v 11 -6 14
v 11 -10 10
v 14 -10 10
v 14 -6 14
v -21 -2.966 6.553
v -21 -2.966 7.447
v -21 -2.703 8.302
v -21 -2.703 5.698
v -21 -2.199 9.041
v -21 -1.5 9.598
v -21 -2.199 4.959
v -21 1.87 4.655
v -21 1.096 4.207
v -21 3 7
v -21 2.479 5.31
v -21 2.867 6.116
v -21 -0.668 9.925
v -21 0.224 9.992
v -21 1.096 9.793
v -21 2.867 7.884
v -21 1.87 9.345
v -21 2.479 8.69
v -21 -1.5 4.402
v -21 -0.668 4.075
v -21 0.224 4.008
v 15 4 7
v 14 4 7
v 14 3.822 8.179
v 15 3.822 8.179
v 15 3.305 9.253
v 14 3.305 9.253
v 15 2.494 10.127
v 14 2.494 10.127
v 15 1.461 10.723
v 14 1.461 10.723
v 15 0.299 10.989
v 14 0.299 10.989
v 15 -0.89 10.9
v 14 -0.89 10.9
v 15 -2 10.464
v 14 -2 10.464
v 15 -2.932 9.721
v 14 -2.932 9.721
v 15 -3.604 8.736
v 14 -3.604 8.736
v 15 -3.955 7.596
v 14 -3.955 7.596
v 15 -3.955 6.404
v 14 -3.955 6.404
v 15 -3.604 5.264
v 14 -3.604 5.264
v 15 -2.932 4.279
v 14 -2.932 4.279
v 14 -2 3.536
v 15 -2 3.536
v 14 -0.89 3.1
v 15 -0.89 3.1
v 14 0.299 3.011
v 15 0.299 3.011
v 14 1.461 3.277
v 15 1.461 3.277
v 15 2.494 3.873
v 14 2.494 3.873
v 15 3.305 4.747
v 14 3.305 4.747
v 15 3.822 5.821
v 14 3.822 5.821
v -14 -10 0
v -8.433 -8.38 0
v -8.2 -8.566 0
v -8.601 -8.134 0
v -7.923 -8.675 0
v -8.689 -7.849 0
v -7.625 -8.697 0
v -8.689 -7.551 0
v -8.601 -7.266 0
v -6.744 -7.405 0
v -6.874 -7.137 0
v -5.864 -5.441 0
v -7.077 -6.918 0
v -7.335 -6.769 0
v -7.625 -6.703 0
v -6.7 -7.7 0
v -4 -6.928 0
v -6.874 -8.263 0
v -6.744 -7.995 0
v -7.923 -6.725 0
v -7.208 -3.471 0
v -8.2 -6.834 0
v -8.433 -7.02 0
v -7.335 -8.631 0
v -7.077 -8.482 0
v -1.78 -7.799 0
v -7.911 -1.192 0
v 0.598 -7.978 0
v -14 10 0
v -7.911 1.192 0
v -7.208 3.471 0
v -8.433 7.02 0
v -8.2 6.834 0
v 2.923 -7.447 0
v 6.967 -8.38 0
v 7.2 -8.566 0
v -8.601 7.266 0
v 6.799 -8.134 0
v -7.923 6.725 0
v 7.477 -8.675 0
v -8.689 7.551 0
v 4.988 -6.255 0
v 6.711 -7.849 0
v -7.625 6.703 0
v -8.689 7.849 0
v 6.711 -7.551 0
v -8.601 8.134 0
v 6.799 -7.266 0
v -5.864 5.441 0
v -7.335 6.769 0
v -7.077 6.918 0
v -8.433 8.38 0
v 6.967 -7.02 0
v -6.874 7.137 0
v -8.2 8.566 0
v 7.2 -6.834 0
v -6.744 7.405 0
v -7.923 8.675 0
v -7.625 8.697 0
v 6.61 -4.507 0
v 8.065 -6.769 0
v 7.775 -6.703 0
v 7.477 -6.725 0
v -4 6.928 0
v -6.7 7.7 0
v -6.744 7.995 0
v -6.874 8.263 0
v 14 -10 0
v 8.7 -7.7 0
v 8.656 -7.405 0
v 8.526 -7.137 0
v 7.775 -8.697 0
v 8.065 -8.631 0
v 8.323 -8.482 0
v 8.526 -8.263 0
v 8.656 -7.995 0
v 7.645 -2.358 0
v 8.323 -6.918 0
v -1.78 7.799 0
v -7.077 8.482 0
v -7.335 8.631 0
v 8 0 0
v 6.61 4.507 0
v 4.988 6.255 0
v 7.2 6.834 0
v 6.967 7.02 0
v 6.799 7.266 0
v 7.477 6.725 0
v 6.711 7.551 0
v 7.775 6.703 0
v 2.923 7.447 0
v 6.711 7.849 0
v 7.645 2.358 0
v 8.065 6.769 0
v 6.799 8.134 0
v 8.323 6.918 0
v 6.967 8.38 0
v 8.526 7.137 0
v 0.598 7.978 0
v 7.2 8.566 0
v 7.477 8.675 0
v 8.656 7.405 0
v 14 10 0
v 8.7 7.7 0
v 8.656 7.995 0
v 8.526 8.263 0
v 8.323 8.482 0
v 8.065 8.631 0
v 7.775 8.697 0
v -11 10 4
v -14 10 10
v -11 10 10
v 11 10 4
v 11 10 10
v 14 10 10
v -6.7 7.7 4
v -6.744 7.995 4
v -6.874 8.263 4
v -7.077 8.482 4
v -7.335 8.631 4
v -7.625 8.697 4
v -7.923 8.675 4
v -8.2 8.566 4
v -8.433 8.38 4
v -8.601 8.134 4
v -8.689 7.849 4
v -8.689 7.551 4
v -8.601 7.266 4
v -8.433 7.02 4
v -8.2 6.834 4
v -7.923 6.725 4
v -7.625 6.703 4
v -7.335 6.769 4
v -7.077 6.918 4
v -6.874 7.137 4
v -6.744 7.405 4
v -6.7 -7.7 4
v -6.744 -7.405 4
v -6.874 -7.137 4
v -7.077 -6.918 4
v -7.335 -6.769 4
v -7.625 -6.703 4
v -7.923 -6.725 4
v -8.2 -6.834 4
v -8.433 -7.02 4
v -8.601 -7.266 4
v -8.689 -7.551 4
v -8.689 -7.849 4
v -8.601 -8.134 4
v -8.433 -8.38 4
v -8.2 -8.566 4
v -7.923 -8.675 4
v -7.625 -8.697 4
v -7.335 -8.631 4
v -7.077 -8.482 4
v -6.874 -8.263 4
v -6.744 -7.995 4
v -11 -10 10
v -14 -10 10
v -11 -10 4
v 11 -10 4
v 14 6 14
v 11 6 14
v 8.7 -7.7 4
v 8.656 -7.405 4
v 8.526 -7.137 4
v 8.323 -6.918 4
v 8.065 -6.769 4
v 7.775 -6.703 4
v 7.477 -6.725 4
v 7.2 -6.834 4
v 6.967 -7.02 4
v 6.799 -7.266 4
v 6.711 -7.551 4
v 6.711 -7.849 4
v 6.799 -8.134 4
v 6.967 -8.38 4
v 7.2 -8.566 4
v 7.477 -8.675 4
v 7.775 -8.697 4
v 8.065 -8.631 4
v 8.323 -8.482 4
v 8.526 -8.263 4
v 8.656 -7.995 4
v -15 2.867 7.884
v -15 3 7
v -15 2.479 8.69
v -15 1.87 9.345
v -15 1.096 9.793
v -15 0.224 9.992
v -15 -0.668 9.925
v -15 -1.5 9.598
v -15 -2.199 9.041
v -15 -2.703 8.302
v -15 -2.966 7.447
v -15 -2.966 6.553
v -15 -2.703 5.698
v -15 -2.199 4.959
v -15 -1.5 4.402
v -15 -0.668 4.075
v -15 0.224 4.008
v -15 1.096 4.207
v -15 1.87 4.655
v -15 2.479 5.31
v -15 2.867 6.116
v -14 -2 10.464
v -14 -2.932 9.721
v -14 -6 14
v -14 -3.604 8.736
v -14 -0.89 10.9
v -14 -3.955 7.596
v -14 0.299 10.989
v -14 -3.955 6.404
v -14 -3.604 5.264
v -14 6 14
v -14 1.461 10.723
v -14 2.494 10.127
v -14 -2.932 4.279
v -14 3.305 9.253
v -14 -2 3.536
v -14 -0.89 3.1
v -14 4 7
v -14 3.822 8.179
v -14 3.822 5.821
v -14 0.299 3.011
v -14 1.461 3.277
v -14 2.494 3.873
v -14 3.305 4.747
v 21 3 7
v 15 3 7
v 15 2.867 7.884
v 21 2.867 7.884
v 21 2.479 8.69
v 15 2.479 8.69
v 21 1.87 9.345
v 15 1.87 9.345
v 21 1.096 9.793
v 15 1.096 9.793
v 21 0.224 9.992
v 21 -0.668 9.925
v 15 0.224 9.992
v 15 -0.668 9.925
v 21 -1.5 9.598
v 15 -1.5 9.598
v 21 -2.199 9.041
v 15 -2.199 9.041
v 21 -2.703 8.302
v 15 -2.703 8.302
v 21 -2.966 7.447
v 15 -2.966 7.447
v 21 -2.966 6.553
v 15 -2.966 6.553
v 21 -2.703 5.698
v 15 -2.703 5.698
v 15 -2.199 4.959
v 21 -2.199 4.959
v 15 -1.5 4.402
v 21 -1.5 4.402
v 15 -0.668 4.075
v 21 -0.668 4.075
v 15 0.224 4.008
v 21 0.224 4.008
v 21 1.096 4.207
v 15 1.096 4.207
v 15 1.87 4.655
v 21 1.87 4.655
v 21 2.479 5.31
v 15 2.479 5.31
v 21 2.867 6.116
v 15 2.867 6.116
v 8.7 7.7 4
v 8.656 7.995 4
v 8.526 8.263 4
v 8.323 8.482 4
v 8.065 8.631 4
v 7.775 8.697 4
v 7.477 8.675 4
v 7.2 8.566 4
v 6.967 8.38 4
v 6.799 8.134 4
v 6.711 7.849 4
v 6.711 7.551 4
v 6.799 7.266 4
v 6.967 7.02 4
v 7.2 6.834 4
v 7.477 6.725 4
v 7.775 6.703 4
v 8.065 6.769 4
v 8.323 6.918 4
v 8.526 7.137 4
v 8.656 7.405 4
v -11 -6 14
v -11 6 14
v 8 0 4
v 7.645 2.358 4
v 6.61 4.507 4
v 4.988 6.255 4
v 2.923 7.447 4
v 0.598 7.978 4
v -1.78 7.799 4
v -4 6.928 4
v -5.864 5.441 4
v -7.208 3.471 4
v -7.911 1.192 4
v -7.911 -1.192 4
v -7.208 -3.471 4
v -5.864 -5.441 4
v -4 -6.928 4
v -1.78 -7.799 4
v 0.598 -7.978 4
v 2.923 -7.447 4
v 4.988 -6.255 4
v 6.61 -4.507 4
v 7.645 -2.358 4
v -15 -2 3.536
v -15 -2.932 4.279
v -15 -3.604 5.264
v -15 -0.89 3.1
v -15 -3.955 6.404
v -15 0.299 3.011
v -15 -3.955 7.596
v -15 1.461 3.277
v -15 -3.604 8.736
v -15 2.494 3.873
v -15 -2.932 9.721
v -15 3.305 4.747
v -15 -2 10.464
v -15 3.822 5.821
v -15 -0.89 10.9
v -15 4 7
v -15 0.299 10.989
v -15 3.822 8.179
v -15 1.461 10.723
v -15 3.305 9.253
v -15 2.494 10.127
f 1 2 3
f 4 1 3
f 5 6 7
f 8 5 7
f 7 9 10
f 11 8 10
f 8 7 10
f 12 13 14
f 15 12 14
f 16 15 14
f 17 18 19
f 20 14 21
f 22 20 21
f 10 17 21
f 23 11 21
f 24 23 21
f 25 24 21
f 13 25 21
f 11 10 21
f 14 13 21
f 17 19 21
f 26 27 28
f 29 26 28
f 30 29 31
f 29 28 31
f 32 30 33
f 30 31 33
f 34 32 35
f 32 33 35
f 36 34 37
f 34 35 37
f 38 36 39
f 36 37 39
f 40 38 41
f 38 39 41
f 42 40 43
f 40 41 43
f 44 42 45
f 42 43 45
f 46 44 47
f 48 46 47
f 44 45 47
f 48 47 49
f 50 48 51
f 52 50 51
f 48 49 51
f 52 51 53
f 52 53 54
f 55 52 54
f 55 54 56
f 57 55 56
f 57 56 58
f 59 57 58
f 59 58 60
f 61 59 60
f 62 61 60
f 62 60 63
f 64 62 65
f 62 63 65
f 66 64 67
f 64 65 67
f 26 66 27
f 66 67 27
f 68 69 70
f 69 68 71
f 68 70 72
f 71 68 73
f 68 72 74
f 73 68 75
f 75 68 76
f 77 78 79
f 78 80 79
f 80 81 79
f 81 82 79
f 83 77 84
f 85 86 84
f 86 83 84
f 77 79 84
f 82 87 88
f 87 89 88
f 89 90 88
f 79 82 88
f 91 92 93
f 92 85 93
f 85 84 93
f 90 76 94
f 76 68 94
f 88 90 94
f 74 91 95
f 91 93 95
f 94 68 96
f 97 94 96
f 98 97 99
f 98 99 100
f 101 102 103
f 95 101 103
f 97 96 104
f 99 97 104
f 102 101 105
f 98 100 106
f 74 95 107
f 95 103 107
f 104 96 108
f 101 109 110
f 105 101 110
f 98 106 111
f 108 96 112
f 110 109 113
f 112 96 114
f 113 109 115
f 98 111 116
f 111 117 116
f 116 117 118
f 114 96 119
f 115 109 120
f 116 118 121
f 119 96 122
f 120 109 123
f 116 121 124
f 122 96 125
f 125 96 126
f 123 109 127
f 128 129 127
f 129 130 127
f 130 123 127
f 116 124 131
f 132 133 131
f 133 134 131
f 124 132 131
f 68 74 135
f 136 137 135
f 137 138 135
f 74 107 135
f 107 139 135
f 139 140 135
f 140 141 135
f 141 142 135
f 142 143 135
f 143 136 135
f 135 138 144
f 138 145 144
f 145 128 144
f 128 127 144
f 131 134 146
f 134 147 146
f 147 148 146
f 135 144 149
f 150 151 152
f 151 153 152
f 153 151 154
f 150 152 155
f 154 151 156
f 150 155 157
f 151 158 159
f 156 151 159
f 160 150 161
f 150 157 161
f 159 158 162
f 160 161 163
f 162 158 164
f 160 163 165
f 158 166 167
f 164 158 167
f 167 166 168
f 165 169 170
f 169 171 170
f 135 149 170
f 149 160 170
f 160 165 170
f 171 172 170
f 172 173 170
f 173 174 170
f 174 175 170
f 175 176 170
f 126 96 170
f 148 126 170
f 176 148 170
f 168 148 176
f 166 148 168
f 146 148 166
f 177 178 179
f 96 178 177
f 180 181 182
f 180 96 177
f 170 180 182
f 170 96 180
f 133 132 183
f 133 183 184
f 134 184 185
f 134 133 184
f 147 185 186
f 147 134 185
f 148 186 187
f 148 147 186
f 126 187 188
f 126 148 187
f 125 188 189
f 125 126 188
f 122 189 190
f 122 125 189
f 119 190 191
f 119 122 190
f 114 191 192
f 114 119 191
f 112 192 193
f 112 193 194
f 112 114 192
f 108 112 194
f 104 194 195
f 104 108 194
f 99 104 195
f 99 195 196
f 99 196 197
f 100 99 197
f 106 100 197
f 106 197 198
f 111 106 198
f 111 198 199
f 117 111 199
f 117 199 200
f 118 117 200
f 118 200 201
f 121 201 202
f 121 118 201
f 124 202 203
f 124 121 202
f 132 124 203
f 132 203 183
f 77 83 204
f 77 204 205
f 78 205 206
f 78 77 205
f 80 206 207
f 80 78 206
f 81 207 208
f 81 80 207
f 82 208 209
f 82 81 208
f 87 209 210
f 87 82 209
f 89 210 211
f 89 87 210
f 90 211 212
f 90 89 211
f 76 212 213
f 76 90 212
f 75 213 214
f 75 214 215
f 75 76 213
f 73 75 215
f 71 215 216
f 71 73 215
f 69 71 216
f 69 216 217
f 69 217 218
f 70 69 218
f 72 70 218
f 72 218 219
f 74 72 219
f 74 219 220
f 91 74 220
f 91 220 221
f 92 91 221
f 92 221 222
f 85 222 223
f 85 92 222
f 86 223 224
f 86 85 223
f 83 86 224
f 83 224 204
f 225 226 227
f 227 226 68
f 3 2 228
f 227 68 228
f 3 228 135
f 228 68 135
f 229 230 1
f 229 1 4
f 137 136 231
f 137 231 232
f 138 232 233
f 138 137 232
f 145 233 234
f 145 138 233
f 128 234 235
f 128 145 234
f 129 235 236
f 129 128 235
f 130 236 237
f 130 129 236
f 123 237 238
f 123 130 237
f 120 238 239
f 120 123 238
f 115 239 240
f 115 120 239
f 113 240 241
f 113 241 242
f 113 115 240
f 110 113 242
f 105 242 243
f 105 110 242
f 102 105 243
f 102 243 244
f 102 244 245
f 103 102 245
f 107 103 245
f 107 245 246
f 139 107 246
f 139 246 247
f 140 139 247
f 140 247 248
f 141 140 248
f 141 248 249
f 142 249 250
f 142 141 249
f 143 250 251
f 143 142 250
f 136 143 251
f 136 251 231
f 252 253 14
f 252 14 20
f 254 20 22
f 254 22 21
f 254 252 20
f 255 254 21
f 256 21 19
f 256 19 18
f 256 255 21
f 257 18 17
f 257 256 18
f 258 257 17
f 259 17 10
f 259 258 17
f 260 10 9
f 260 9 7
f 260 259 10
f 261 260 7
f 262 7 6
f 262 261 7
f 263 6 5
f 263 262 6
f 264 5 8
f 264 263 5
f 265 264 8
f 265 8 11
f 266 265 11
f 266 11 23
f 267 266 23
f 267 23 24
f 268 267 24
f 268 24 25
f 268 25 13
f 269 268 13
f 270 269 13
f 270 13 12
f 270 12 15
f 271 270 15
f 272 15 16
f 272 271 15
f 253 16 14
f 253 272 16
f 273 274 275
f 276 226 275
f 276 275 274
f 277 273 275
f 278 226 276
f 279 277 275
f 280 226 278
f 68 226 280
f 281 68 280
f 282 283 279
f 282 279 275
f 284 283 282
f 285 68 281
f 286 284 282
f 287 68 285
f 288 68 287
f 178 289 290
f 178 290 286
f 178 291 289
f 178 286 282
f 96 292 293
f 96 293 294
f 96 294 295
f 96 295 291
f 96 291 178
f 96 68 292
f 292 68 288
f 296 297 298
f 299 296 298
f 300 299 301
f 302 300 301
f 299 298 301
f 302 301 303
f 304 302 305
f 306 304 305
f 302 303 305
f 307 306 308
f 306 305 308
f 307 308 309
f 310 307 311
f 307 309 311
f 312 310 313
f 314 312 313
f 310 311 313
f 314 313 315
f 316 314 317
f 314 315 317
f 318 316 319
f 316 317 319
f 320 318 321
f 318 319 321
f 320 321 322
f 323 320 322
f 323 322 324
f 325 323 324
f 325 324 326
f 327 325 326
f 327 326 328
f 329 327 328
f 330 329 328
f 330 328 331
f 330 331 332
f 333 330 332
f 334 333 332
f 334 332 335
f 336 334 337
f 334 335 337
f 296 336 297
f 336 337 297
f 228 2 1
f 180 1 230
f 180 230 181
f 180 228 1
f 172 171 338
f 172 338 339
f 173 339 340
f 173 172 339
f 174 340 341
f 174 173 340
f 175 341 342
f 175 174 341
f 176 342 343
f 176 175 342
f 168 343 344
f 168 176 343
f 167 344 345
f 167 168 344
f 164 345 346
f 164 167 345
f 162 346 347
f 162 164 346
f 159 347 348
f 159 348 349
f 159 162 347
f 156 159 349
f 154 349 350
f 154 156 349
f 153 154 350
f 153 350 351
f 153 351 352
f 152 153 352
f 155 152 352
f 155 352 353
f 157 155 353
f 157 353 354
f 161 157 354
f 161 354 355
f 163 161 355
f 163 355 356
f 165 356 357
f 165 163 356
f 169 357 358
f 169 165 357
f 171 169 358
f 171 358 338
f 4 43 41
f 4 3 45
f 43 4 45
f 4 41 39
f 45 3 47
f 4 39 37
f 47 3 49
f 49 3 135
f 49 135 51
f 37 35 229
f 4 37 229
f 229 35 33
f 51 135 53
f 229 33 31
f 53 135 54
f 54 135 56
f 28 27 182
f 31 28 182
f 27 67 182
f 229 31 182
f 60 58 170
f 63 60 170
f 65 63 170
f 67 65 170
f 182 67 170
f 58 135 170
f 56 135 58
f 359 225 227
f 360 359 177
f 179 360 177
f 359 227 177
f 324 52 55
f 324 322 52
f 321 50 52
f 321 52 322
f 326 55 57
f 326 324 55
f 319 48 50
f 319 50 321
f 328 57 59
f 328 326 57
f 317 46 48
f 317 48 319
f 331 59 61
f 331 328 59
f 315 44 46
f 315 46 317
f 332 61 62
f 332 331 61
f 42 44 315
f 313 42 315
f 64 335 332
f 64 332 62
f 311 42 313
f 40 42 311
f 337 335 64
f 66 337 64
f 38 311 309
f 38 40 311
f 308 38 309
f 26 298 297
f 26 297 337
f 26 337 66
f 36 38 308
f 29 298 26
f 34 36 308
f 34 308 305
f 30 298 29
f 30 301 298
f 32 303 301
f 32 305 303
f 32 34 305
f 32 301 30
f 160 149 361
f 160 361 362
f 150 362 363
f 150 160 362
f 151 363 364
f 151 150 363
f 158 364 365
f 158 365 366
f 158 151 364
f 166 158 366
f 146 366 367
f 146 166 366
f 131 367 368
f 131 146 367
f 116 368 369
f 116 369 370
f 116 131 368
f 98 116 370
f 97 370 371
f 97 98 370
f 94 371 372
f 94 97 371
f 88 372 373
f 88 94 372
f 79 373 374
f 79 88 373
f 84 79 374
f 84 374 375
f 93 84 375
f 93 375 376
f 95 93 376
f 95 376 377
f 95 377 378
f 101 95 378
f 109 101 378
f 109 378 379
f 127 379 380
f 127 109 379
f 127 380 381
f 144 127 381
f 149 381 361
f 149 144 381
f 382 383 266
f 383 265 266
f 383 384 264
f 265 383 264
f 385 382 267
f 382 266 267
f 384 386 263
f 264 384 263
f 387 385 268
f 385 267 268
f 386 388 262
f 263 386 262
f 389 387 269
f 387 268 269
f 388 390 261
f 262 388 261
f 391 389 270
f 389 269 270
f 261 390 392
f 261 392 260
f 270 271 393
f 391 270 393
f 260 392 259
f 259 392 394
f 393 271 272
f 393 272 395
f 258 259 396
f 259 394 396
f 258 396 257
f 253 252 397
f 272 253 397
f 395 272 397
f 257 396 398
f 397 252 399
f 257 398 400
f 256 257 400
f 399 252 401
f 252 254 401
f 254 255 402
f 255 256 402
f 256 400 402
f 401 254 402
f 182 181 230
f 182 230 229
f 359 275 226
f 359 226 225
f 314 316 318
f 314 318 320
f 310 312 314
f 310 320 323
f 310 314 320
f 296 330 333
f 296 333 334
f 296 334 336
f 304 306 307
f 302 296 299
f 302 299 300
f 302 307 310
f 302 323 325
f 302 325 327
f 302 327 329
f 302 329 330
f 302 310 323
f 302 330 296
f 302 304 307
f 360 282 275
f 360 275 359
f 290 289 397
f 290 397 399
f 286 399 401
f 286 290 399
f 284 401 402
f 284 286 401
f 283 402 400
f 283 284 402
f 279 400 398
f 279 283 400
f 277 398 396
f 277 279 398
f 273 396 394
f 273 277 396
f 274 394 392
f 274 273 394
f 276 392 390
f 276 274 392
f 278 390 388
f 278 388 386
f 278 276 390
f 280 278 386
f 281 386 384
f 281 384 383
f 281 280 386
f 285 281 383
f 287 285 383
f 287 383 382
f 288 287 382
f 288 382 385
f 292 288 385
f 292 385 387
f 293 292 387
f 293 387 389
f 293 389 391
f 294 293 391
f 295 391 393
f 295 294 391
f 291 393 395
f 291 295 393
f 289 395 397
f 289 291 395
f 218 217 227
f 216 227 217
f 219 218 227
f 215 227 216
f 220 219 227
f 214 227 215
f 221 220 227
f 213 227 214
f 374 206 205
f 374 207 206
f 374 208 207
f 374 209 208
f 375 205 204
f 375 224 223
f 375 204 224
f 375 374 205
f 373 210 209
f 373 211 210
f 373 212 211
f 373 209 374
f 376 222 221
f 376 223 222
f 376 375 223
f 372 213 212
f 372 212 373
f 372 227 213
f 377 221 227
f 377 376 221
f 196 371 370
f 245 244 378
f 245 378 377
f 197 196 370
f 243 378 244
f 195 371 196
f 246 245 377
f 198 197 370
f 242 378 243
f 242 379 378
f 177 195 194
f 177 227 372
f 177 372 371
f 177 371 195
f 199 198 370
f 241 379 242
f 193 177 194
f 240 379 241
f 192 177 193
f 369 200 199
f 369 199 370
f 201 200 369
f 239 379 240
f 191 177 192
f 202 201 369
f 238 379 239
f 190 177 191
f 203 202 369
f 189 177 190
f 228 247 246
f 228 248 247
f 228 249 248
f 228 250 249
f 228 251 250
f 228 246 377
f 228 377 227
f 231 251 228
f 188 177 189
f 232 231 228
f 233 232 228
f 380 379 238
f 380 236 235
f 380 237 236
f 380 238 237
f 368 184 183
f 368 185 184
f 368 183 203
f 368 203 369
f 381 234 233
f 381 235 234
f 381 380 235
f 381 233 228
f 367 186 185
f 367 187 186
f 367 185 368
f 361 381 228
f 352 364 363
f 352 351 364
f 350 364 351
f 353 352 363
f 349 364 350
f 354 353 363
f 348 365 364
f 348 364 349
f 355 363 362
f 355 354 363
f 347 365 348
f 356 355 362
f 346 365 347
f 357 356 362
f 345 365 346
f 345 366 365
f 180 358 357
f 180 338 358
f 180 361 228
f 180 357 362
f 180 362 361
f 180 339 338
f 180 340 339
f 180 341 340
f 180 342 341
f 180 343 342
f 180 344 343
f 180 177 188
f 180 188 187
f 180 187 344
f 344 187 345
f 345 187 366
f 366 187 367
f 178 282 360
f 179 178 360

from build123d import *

# Parameters (mm, degrees)
SKETCH_1_W      = 28
SKETCH_1_H      = 20
SKETCH_1_R      = 1
SKETCH_1_R_2    = 8
EXTRUDE_1_DEPTH = 4
SKETCH_2_W      = 3
SKETCH_2_H      = 20
EXTRUDE_2_DEPTH = 10
SKETCH_3_R      = 4
SKETCH_3_R_2    = 3
EXTRUDE_3_DEPTH = 1
SKETCH_4_R      = 3
EXTRUDE_4_DEPTH = 6
CHAMFER_1_SIZE  = 4


with BuildPart() as part:
    # 草图1 → 凸台-拉伸1 (new body)
    with BuildSketch(Plane.XY):
        Rectangle(SKETCH_1_W, SKETCH_1_H)
        with Locations((7.7, -7.7)):
            Circle(SKETCH_1_R, mode=Mode.SUBTRACT)
        Circle(SKETCH_1_R_2, mode=Mode.SUBTRACT)
        with Locations((-7.7, -7.7)):
            Circle(SKETCH_1_R, mode=Mode.SUBTRACT)
        with Locations((-7.7, 7.7)):
            Circle(SKETCH_1_R, mode=Mode.SUBTRACT)
        with Locations((7.7, 7.7)):
            Circle(SKETCH_1_R, mode=Mode.SUBTRACT)
    extrude(amount=EXTRUDE_1_DEPTH)

    # 草图2 → 凸台-拉伸2 (add)
    with BuildSketch(Plane.XY.offset(4)):
        with Locations((-12.5, 0)):
            Rectangle(SKETCH_2_W, SKETCH_2_H)
        with Locations((12.5, 0)):
            Rectangle(SKETCH_2_W, SKETCH_2_H)
    extrude(amount=EXTRUDE_2_DEPTH)

    # 草图3 → 凸台-拉伸3 (add)
    # profile 1 of 2: a face of its own
    with BuildSketch(Plane(origin=(14, 0, 0), x_dir=(0, 0, -1), z_dir=(1, 0, 0))):
        with Locations(Location((-7, 0, 0), (0, 0, 90))):
            Circle(SKETCH_3_R)
        with Locations((-7, 0)):
            Circle(SKETCH_3_R_2, mode=Mode.SUBTRACT)
    # profile 2 of 2: a face of its own
    with BuildSketch(Plane(origin=(14, 0, 0), x_dir=(0, 0, -1), z_dir=(1, 0, 0))):
        with Locations((-7, 0)):
            Circle(SKETCH_3_R_2)
    extrude_3 = extrude(amount=EXTRUDE_3_DEPTH)

    # 草图4 → 凸台-拉伸4 (add)
    with BuildSketch(Plane(origin=(15, 0, 0), x_dir=(0, 0, -1), z_dir=(1, 0, 0))):
        with Locations(Location((-7, 0, 0), (0, 0, 90))):
            Circle(SKETCH_4_R)
    extrude_4 = extrude(amount=EXTRUDE_4_DEPTH)

    # 倒角1
    chamfer_1_edges = [part.edges().sort_by_distance(p)[0] for p in [
        (-12.5, -10, 14),
        (-12.5, 10, 14),
        (12.5, 10, 14),
        (12.5, -10, 14),
    ]]
    chamfer(chamfer_1_edges, length=CHAMFER_1_SIZE)

    # 镜向2: 凸台-拉伸3, 凸台-拉伸4 across plane
    add(extrude_3.mirror(Plane(origin=(0, 0, 0), x_dir=(0, 0, 1), z_dir=(1, 0, 0))))
    add(extrude_4.mirror(Plane(origin=(0, 0, 0), x_dir=(0, 0, 1), z_dir=(1, 0, 0))))


solid = part.part
